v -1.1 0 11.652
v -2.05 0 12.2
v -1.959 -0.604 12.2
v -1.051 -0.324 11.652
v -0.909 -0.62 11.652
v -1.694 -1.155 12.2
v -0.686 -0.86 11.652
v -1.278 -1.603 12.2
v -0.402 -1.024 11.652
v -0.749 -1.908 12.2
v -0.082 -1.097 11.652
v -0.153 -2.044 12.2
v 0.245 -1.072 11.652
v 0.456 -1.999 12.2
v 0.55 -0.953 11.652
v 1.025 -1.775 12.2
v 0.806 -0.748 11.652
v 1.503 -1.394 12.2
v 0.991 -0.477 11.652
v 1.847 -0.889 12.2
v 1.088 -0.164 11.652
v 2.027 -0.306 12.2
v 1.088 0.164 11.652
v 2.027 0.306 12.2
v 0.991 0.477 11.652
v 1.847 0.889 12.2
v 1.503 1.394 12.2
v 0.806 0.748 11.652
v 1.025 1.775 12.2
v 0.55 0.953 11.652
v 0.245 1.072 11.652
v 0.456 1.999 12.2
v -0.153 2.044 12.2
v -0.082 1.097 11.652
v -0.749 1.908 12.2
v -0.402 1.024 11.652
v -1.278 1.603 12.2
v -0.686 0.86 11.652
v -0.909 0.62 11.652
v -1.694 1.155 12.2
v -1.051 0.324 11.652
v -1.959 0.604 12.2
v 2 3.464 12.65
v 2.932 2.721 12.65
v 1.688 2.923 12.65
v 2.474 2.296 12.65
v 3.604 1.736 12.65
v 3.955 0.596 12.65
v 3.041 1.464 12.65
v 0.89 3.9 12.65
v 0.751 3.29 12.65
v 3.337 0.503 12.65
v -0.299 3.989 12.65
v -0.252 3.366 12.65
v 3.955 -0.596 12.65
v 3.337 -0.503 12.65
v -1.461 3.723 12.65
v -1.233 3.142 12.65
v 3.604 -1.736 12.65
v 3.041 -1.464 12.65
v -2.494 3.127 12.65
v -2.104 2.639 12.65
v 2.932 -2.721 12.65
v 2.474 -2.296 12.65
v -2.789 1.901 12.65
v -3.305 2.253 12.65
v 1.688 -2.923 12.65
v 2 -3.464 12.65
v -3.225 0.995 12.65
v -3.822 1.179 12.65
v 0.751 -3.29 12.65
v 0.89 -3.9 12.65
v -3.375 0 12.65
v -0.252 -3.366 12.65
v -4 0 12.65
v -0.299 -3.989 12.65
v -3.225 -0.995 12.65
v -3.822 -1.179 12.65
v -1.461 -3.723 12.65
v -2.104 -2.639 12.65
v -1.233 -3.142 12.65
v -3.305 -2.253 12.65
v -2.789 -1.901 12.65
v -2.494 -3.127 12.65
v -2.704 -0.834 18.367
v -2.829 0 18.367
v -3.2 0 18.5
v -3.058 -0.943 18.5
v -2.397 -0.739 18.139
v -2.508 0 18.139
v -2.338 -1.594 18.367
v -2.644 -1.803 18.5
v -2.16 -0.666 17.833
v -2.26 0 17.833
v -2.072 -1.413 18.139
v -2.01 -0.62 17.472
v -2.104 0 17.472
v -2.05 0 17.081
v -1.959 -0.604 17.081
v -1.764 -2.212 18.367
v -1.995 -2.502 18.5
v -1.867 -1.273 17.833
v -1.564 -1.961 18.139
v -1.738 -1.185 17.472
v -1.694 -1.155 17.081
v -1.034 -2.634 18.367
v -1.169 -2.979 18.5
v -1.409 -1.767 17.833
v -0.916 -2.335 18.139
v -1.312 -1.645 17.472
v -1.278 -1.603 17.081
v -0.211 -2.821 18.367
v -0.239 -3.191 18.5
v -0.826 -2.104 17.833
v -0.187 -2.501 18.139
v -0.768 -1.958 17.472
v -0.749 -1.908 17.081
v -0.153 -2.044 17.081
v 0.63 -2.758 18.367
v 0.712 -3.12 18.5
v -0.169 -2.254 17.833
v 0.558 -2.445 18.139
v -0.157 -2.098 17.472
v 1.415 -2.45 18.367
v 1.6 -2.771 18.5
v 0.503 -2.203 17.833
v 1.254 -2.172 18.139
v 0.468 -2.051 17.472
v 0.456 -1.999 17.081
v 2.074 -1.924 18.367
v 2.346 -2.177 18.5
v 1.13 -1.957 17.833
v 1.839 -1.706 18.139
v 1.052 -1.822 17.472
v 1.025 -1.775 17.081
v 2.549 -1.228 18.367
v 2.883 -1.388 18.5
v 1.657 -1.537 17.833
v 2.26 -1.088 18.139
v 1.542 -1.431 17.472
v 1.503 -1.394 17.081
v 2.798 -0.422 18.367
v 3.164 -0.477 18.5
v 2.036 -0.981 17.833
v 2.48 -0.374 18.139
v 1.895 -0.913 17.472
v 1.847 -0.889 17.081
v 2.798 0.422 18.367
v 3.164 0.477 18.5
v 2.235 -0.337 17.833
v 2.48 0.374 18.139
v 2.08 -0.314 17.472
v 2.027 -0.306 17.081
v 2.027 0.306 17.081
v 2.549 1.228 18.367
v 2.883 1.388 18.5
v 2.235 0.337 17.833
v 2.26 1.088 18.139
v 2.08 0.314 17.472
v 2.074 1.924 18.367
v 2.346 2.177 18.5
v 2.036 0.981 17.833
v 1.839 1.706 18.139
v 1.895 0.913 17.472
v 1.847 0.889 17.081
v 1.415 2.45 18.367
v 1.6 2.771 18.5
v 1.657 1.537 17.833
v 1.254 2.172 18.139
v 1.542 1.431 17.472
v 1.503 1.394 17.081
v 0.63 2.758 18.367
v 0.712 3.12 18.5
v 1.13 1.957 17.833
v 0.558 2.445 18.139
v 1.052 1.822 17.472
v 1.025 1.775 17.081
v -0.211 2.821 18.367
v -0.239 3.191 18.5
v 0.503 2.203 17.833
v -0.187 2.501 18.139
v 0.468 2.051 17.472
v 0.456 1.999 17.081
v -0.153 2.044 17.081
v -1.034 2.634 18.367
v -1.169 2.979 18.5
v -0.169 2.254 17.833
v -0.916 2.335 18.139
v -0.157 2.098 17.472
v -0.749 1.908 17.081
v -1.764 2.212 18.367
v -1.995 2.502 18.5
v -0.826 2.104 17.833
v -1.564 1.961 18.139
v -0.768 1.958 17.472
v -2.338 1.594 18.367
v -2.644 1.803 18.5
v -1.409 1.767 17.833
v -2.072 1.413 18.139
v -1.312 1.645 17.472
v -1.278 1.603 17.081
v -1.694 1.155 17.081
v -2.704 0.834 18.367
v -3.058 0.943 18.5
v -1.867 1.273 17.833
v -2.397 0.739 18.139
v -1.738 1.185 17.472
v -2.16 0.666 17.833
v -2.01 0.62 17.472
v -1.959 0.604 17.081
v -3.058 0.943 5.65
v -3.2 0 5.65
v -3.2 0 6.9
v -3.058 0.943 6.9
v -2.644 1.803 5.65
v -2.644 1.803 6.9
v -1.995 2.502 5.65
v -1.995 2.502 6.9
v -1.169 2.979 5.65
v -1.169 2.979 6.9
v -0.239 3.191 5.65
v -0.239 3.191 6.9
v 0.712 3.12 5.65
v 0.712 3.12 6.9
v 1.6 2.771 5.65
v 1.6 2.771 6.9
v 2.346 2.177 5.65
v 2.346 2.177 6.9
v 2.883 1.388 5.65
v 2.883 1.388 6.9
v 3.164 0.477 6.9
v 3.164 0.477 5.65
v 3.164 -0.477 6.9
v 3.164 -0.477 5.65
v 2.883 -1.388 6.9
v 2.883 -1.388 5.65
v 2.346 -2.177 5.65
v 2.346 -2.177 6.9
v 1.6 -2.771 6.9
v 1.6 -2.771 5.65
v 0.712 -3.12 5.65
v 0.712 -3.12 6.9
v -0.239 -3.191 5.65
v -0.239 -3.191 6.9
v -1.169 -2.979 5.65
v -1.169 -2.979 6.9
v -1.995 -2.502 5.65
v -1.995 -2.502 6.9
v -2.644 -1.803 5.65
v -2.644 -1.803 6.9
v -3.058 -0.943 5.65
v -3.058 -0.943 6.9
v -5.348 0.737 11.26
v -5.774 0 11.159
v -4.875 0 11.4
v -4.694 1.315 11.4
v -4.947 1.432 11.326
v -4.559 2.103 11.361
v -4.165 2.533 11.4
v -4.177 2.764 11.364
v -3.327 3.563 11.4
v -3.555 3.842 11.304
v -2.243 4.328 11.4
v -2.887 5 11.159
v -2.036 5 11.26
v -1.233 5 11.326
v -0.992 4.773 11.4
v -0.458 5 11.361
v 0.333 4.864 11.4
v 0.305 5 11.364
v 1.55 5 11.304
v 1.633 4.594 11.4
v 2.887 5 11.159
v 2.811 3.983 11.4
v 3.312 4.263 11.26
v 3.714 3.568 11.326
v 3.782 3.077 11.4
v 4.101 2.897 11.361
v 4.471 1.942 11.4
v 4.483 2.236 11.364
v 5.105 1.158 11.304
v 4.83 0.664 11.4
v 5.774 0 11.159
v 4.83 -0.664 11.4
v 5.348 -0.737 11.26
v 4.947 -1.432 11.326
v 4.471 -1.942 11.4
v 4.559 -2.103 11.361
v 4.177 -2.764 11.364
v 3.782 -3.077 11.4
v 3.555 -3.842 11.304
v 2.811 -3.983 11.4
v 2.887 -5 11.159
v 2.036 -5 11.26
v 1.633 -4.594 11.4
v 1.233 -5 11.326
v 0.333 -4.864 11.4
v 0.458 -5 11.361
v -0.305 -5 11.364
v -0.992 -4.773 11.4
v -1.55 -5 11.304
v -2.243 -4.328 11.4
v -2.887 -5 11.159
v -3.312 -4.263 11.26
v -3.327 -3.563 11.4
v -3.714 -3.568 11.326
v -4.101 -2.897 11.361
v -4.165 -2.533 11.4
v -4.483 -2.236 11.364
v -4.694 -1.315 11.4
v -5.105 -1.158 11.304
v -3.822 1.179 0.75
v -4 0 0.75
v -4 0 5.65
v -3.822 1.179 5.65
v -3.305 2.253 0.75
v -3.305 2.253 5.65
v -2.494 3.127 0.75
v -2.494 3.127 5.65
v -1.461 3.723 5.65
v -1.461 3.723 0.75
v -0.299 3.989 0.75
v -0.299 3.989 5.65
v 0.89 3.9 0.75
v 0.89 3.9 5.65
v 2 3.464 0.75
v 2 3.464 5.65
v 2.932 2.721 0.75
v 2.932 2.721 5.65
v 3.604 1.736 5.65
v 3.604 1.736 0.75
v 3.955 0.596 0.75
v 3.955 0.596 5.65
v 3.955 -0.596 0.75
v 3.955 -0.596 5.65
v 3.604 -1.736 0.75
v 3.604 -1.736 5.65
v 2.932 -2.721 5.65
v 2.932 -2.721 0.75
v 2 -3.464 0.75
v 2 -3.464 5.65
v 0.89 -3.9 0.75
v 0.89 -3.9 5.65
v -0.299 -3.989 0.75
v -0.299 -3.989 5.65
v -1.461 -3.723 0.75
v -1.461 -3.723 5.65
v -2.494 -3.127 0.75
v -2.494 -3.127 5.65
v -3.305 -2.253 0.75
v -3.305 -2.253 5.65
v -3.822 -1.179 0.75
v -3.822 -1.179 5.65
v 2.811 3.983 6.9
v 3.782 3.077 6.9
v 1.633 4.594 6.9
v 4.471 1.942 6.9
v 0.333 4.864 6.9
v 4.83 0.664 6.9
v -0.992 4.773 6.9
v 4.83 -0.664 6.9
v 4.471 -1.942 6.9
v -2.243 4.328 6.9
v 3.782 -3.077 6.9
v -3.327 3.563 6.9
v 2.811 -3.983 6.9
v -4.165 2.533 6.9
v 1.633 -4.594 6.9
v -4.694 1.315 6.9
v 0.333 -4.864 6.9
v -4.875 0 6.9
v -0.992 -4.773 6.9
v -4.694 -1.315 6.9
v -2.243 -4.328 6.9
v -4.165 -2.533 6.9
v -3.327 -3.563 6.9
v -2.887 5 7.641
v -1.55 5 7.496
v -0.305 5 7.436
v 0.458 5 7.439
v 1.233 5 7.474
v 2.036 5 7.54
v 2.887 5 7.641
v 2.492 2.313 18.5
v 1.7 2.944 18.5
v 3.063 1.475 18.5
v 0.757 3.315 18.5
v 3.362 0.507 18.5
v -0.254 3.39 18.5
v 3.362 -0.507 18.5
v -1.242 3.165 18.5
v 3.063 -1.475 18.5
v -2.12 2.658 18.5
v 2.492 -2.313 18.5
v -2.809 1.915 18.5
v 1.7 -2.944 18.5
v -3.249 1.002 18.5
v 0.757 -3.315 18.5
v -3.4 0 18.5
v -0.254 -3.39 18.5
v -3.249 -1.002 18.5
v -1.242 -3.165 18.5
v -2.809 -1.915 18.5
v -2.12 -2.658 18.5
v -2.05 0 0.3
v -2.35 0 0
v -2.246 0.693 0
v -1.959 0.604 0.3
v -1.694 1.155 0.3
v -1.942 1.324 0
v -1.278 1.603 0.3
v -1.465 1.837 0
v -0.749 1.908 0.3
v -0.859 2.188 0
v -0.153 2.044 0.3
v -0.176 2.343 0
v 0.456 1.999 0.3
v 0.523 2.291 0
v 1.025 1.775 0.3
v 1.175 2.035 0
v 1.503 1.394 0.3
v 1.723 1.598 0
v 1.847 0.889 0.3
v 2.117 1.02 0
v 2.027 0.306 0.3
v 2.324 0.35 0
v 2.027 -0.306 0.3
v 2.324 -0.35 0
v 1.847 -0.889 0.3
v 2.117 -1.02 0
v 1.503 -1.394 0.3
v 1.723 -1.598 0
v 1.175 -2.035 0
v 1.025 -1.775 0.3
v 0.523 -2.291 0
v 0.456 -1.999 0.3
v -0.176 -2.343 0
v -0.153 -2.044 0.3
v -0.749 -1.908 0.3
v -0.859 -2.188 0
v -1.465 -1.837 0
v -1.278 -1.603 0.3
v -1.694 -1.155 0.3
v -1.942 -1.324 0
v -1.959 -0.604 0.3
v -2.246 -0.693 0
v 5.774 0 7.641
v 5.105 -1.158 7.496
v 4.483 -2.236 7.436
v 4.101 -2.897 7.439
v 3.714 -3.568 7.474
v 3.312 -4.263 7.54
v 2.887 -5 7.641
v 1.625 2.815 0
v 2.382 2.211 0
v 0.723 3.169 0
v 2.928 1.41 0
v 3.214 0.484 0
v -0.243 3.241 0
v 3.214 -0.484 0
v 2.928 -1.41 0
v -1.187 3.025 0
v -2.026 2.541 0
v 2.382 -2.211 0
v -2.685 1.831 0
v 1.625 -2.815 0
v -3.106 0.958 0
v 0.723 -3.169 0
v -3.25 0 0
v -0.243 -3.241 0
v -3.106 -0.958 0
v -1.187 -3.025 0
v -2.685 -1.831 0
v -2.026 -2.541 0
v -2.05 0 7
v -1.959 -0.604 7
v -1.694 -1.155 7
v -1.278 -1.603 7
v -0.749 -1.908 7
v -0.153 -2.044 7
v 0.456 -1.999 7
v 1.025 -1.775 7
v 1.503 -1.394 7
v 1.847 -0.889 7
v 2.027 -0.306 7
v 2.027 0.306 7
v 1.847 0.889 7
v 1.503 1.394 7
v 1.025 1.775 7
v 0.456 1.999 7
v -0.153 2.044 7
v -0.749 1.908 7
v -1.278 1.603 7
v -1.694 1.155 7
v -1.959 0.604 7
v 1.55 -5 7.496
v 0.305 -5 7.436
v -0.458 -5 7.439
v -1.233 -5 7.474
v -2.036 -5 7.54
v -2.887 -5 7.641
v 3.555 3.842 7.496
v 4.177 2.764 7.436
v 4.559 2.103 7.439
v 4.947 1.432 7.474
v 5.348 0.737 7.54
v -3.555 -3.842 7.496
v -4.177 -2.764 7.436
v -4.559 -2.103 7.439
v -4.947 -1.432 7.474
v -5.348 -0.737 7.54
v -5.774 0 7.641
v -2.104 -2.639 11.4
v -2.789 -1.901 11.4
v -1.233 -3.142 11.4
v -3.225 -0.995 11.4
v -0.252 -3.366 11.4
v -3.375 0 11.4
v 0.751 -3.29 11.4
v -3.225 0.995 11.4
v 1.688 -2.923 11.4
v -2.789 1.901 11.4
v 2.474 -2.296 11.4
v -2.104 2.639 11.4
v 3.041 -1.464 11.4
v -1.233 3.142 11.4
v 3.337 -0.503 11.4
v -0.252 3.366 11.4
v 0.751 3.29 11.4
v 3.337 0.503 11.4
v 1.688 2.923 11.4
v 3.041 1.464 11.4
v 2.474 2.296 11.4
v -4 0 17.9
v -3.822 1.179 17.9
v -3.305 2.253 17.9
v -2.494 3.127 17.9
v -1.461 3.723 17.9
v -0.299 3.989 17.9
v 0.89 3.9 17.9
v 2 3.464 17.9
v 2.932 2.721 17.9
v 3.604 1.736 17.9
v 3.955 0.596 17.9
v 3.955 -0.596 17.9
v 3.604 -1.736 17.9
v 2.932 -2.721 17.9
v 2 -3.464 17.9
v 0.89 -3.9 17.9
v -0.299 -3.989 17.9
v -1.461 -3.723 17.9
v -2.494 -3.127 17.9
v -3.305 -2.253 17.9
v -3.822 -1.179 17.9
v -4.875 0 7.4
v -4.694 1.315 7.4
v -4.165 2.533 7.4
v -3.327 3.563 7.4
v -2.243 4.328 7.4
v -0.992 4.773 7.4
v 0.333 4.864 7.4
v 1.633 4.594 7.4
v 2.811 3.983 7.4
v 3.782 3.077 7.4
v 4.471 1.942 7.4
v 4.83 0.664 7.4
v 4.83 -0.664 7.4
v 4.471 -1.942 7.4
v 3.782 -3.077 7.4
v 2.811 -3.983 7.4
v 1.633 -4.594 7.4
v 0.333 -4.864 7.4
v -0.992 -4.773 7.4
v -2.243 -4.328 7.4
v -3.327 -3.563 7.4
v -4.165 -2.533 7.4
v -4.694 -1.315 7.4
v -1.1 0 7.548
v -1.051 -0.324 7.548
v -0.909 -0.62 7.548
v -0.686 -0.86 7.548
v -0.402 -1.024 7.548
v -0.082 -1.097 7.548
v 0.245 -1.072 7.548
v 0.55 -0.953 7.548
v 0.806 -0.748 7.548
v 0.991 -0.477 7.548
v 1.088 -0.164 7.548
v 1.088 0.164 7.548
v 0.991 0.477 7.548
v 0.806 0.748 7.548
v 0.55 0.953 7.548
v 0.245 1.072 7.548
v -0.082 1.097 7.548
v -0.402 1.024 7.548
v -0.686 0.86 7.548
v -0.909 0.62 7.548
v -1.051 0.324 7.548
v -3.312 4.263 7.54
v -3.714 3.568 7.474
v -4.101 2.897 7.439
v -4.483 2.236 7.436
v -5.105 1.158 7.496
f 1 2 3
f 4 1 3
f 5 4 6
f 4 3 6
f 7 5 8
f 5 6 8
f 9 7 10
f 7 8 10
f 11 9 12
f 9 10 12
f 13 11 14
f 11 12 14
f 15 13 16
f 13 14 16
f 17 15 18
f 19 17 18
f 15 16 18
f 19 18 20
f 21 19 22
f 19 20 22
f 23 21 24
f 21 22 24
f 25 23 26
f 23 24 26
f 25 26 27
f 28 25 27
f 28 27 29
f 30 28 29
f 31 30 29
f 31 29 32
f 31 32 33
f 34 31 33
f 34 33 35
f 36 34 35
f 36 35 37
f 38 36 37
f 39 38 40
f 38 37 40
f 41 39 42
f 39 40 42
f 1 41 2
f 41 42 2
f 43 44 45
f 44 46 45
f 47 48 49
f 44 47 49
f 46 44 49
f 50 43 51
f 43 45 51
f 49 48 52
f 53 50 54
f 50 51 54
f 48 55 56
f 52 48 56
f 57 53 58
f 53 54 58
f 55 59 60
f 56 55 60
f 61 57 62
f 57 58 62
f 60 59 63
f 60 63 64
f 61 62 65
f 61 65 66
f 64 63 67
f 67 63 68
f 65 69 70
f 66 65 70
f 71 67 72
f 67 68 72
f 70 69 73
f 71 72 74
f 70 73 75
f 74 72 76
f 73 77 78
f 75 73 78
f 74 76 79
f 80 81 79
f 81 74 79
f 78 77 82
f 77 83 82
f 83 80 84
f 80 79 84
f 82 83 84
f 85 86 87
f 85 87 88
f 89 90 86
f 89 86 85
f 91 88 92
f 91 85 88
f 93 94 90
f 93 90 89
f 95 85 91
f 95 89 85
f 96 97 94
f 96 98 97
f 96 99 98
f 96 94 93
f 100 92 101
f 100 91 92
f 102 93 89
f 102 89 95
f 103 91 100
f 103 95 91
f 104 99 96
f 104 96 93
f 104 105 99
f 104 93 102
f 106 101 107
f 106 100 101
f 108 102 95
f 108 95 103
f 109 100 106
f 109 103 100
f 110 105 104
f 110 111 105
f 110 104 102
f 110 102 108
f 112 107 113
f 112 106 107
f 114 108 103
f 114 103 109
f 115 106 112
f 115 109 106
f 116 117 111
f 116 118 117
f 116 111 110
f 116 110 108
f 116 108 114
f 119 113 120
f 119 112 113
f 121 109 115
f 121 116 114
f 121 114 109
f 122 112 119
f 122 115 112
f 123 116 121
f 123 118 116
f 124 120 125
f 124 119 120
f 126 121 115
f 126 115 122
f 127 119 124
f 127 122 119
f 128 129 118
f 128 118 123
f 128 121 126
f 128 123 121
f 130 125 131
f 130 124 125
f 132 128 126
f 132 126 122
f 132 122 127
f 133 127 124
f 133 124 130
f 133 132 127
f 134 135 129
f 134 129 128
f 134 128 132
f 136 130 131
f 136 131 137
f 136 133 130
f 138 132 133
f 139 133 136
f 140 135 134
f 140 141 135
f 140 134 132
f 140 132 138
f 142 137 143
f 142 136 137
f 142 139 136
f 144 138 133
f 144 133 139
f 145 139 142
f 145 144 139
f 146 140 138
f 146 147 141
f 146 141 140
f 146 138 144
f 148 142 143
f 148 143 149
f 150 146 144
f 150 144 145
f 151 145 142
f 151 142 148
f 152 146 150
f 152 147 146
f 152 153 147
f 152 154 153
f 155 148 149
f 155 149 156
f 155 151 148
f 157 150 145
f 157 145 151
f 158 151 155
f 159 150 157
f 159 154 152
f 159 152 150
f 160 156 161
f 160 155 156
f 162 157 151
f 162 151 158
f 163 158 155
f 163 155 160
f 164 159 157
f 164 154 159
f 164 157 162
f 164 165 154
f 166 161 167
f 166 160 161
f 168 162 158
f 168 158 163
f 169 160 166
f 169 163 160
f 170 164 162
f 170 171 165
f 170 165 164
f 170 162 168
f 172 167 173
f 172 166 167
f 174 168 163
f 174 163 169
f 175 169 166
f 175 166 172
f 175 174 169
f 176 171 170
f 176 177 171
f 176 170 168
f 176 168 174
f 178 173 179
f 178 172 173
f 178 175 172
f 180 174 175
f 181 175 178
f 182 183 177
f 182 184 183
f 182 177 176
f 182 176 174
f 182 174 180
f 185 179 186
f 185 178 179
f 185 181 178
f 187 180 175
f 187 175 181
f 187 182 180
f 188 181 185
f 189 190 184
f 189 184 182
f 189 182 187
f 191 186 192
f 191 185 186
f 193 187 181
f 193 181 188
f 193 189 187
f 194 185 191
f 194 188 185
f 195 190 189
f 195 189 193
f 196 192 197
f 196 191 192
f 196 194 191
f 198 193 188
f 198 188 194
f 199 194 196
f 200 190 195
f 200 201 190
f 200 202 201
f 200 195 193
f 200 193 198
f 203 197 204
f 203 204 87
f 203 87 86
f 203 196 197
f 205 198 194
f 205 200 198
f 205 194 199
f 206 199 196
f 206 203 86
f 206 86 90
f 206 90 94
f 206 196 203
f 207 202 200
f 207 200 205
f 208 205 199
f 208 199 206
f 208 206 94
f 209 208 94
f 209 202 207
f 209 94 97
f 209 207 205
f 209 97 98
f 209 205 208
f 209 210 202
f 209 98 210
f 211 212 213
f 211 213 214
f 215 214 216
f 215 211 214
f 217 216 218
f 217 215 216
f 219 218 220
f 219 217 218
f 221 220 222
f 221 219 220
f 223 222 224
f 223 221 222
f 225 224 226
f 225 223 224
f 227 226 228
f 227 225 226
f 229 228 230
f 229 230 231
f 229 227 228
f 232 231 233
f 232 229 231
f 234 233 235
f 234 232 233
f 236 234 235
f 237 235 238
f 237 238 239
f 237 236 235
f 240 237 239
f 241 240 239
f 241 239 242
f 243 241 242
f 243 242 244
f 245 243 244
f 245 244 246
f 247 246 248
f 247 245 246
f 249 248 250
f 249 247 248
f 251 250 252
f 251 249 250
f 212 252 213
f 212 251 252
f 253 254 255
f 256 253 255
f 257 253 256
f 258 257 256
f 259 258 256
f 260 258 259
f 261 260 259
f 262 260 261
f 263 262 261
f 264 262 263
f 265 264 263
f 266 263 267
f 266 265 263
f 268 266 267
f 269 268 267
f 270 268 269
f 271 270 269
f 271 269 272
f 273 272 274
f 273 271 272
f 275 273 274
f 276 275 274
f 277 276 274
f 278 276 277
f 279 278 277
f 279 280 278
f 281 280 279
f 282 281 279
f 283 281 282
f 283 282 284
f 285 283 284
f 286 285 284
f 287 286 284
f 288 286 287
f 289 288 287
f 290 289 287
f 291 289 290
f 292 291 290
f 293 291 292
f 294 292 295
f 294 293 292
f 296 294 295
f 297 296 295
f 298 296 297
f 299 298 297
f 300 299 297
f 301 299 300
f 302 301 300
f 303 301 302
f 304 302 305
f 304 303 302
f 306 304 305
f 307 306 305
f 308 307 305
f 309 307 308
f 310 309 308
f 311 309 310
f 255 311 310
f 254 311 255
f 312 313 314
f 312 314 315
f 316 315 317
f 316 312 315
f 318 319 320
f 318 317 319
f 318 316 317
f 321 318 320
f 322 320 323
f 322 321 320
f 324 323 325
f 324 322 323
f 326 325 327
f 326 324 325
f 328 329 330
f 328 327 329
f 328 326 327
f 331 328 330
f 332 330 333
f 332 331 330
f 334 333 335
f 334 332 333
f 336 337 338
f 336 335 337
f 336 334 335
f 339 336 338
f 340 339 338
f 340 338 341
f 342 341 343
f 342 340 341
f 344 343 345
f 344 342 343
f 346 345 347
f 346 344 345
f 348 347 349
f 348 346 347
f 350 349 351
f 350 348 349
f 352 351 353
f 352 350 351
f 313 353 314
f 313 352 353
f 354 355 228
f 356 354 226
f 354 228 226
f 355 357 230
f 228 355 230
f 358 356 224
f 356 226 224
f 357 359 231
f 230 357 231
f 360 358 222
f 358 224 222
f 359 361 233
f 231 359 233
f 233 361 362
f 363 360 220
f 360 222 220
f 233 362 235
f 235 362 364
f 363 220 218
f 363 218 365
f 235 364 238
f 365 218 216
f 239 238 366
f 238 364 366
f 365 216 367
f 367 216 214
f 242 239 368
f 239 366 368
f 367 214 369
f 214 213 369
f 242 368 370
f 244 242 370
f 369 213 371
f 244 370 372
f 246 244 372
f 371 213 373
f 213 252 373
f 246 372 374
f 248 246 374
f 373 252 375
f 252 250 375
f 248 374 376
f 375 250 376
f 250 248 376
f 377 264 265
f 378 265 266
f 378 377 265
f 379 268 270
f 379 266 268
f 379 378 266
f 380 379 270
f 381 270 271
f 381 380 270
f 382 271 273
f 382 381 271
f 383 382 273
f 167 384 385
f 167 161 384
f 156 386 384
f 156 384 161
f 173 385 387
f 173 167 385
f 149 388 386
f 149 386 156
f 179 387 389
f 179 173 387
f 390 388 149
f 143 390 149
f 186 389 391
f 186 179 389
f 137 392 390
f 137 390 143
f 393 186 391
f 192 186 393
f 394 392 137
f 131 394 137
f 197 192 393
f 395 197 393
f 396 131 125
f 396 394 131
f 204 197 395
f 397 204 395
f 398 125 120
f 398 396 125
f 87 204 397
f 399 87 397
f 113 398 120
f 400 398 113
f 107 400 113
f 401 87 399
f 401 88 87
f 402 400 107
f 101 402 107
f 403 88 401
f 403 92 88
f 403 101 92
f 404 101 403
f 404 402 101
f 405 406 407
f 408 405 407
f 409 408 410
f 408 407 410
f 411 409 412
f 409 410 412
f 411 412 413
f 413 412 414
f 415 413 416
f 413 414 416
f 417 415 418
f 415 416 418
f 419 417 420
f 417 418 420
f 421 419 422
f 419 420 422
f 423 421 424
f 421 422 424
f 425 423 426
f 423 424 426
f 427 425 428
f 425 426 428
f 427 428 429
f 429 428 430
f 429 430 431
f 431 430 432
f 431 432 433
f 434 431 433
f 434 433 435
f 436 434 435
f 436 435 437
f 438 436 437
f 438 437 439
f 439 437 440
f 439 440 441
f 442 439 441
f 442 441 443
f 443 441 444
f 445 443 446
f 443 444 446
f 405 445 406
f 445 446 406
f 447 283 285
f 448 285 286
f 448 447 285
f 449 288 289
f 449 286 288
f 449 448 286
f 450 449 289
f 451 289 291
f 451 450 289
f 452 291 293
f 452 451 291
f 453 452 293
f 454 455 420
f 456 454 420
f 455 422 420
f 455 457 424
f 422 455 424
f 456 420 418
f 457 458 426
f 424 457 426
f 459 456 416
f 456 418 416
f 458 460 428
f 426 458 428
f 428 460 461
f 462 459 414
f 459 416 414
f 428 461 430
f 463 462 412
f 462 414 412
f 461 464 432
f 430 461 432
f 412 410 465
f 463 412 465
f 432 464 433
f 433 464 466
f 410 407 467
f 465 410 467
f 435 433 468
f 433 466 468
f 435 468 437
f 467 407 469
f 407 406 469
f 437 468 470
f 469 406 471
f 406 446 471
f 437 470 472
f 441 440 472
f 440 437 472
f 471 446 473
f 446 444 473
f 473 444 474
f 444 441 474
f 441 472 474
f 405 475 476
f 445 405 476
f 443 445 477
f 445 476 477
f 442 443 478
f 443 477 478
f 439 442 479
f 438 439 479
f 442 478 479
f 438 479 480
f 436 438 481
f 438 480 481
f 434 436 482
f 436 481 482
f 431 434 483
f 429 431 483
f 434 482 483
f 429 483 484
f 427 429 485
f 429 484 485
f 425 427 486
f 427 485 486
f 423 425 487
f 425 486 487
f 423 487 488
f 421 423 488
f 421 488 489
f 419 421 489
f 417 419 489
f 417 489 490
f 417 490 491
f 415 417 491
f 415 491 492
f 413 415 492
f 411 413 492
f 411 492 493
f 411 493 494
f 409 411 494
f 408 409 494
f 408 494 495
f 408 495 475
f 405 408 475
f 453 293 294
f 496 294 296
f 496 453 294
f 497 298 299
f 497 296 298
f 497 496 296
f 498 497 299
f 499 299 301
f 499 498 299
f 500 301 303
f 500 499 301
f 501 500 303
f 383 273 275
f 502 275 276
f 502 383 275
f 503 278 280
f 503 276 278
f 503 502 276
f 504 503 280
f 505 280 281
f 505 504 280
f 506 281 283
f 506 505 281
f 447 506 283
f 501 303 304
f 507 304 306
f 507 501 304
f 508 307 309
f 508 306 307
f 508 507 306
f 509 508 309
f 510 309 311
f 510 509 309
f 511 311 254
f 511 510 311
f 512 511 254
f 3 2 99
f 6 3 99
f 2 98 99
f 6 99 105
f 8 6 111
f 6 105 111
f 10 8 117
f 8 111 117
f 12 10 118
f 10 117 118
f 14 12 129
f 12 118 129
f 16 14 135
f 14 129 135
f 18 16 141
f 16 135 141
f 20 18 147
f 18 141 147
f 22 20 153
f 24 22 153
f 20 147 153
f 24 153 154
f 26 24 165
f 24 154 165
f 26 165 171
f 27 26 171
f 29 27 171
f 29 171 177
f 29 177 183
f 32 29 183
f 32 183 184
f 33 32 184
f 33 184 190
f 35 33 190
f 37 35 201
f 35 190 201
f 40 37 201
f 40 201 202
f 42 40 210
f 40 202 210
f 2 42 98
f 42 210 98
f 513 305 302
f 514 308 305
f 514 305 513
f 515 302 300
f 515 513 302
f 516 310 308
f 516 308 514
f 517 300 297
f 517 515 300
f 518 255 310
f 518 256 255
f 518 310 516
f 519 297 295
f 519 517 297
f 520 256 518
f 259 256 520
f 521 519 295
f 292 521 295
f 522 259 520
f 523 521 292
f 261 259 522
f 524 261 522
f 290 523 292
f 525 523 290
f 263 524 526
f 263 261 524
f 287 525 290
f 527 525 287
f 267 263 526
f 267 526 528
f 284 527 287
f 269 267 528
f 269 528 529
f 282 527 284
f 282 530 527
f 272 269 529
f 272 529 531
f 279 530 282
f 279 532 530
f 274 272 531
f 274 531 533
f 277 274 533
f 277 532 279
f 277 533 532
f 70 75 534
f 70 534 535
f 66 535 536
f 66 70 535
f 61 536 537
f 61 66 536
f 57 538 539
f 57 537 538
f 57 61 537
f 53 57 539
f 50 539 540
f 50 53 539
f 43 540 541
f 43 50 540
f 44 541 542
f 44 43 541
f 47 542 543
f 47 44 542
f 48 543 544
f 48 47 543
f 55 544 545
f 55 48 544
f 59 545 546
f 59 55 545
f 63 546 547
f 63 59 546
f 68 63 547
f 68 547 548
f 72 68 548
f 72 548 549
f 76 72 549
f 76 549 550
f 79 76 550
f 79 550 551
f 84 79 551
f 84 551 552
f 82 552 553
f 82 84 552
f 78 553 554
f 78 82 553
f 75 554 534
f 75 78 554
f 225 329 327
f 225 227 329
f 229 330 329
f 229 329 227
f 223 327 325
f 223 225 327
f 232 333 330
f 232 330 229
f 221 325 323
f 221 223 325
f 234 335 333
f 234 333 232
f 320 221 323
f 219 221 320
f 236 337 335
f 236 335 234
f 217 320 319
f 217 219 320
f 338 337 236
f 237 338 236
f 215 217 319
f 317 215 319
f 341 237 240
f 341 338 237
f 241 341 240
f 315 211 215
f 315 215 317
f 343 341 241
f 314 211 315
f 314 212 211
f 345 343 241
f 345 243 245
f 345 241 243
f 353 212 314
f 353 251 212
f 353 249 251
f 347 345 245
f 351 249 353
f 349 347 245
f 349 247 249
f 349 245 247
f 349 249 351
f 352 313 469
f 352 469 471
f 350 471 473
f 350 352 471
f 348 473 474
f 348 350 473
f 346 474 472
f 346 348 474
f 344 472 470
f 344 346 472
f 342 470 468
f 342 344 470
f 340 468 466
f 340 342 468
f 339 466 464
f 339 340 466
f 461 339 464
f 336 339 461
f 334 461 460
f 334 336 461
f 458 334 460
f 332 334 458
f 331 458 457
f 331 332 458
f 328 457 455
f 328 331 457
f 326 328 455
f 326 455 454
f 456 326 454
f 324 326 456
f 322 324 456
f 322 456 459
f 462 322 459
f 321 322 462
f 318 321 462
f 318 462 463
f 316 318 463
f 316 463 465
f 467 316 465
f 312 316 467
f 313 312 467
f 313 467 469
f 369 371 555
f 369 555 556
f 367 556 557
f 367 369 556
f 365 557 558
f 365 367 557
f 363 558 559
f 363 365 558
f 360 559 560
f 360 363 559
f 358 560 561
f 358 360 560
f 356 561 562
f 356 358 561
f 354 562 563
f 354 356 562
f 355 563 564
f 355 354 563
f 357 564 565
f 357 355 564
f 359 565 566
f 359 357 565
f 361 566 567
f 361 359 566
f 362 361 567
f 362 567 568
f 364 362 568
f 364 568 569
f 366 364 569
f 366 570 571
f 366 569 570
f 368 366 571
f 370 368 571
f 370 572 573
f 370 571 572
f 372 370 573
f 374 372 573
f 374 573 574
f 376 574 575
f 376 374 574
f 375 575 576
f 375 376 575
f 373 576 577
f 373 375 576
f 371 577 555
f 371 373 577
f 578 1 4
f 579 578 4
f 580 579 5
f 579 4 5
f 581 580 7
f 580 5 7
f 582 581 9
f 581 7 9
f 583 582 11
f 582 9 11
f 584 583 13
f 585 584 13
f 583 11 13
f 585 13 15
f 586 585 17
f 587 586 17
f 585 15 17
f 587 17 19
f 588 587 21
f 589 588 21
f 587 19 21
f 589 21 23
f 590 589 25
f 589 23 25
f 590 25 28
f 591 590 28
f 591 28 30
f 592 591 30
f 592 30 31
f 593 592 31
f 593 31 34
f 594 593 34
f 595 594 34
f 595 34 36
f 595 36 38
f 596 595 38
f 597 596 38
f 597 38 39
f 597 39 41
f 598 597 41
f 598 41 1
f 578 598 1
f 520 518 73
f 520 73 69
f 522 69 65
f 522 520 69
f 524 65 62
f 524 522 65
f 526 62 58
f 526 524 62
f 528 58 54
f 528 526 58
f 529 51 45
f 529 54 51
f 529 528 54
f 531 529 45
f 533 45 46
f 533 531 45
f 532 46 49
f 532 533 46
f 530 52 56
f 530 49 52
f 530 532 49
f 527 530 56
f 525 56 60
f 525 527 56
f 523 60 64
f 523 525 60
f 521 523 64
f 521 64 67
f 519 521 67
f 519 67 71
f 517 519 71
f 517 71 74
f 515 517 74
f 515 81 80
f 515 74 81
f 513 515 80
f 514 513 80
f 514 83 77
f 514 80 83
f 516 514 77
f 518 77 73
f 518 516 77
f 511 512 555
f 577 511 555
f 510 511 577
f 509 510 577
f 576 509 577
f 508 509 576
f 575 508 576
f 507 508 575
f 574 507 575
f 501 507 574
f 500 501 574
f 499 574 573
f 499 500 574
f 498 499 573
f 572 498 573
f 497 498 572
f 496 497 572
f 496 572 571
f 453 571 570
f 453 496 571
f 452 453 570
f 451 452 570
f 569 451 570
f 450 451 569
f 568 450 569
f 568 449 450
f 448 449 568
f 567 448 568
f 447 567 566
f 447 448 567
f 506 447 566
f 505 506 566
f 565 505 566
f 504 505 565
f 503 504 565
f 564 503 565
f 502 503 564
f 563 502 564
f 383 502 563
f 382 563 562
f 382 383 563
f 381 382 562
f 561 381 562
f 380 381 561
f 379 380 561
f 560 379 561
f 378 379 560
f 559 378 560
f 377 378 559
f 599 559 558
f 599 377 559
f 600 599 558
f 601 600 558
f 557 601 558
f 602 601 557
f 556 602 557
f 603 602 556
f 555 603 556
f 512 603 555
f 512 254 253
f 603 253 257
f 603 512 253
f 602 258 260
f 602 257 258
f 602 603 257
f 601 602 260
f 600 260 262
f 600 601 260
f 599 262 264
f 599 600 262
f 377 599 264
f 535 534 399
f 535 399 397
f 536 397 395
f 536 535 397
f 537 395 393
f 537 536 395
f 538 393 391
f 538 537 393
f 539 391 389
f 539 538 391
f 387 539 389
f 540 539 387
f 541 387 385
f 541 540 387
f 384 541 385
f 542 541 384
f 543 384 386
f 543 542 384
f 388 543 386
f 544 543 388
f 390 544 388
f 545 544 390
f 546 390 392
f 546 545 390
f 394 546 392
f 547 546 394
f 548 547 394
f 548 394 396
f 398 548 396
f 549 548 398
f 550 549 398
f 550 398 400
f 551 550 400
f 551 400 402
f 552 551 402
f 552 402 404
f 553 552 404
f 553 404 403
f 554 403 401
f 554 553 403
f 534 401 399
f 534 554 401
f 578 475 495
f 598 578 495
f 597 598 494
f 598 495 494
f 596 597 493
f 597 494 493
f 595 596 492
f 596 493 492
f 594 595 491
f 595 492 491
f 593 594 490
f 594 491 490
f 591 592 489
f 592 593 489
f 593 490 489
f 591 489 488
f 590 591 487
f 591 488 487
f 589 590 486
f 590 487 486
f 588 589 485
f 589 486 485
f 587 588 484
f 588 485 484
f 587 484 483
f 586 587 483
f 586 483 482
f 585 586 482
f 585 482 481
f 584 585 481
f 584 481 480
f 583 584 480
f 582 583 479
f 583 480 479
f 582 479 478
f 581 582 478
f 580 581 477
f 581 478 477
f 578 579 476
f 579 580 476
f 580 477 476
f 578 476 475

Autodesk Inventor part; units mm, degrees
ref_plane "YZ Plane" through (0, 0, 0) normal (1, 0, 0) x (0, 1, 0)
ref_plane "XZ Plane" through (0, 0, 0) normal (0, 1, 0) x (-1, 0, 0)
sketch "Náčrt1" plane through (0, 0, 0) normal (0, 1, 0) x (-1, 0, 0)
  line L0 (0, -3.7408) -> (0, 22.4445) projected
  line L1 (9, 0) -> (-1.5, 0) projected
  line L2 (2.05, 0.3) -> (2.05, 7)
  line L3 (2.05, 7) -> (1.1, 7.5485)
  line L4 (1.1, 7.5485) -> (1.1, 11.6515)
  line L5 (1.1, 11.6515) -> (2.05, 12.2)
  line L6 (2.05, 12.2) -> (2.05, 17.0814)
  arc A0 (3.2, 18.5) -> (2.05, 17.0814) centre (3.5, 17.0814) ccw
  line L7 (3.2, 18.5) -> (3.4, 18.5)
  line L8 (3.4, 18.5) -> (4, 17.9)
  line L9 (4, 17.9) -> (4, 12.65)
  line L10 (4, 12.65) -> (3.375, 12.65)
  line L11 (3.375, 12.65) -> (3.375, 11.4)
  line L12 (3.375, 11.4) -> (5, 11.4)
  line L13 (5, 11.4) -> (5, 6.9)
  line L14 (5, 6.9) -> (3.2, 6.9)
  line L15 (3.2, 6.9) -> (3.2, 5.65)
  line L16 (3.2, 5.65) -> (4, 5.65)
  line L17 (4, 5.65) -> (4, 0.75)
  line L18 (4, 0.75) -> (3.25, 0)
  line L19 (3.25, 0) -> (2.35, 0)
  line L20 (2.05, 0.3) -> (2.35, 0)
  line L21 (5, 11.4) -> (7.5, 10.7301)
  line L22 (7.5, 10.7301) -> (7.5, 11.4)
  line L23 (7.5, 11.4) -> (5, 11.4)
  line L24 (7.5, 6.9) -> (5, 6.9)
  line L25 (7.5, 6.9) -> (5, 6.9)
  line L26 (5, 6.9) -> (5, 7.4)
  line L27 (7.5, 6.9) -> (7.5, 8.1034)
  line L28 (7.5, 8.1034) -> (4.875, 7.4)
  line L29 (4.875, 7.4) -> (4.875, 6.9)
  line L30 (4.875, 6.9) -> (7.5, 6.9)
  line L31 (7.5, 10.7301) -> (7.5, 10.6966)
  line L32 (7.5, 10.6966) -> (4.875, 11.4)
  point P0 (0, 0)
  point P1 (5, 7.4335)
  dimension "d0" = 4.1
  dimension "d1" = 2.2
  dimension "d3" = 60
  dimension "d4" = 60
  dimension "d5" = 0.3
  dimension "d6" = 45
  dimension "d7" = 8
  dimension "d8" = 0.75
  dimension "d9" = 1.45
  dimension "d11" = 1.25
  dimension "d12" = 6.4
  dimension "d13" = 18.5
  dimension "d14" = 6.3
  dimension "d15" = 6.75
  dimension "d16" = 10
  dimension "d17" = 7
  dimension "d18" = 1.25
  dimension "d19" = 7.1
  dimension "d20" = 0.6
  dimension "d21" = 6.4
  dimension "d22" = 4.5
  dimension "d32" = 15
  dimension "d33" = 15
  dimension "d35" = 10
  dimension "d38" = 15
  dimension "d39" = 9.75
  dimension "d40" = 0.5
revolve "Rotace1" add sketch "Náčrt1" angle 360 about axis through (0, 0, -10) along (0, 0, 1) contours L1 L20 L2 L3 L4 L5 L6 A0 L7 L8 L9 L10 L11 L12 L32 L13 L28 L29 L14 L15 L16 L17 L18 | L29 L28 L13 L14 | L32 L12 L13
thread "Závit1" size "M8x1.25" class "6g" standard "ANSI Metric M Profile" full length
thread "Závit2" size "M8x1" class "6g" standard "ANSI Metric M Profile" full length
ref_plane "Pracovní rovina1" through (0, 0, 6.9) normal (0, 0, 1) x (1, 0, 0)
sketch "Náčrt2" plane through (0, 0, 6.9) normal (0, 0, 1) x (1, 0, 0)
  circle A0 centre (0, 0) radius 3.2 projected
  circle A1 centre (0, 0) radius 5 projected
  line L0 (-5.7735, 0) -> (-2.8868, 5)
  line L1 (-2.8868, 5) -> (2.8868, 5)
  line L2 (2.8868, 5) -> (5.7735, 0)
  line L3 (5.7735, 0) -> (2.8868, -5)
  line L4 (2.8868, -5) -> (-2.8868, -5)
  line L5 (-2.8868, -5) -> (-5.7735, 0)
  dimension "d29" = 10
extrude "Vysunutí1" add sketch "Náčrt2" along normal blind 4.5
revolve "Rotace2" cut sketch "Náčrt1" angle 360 about axis through (0, 0, -10) along (0, 0, 1) contours L32 L12 L13 | L13 L21 L31 L32 | L23 L22 L21
revolve "Rotace3" cut sketch "Náčrt1" angle 360 about axis through (0, 0, -10) along (0, 0, 1) contours L29 L28 L13 L14 | L13 L28 L27 L24
equation "\"d30\" = d22"
equation "\"d4\" = d3"
equation "\"d38\" = d33"
equation "\"d28\" = -d19 + d13 - d22"
